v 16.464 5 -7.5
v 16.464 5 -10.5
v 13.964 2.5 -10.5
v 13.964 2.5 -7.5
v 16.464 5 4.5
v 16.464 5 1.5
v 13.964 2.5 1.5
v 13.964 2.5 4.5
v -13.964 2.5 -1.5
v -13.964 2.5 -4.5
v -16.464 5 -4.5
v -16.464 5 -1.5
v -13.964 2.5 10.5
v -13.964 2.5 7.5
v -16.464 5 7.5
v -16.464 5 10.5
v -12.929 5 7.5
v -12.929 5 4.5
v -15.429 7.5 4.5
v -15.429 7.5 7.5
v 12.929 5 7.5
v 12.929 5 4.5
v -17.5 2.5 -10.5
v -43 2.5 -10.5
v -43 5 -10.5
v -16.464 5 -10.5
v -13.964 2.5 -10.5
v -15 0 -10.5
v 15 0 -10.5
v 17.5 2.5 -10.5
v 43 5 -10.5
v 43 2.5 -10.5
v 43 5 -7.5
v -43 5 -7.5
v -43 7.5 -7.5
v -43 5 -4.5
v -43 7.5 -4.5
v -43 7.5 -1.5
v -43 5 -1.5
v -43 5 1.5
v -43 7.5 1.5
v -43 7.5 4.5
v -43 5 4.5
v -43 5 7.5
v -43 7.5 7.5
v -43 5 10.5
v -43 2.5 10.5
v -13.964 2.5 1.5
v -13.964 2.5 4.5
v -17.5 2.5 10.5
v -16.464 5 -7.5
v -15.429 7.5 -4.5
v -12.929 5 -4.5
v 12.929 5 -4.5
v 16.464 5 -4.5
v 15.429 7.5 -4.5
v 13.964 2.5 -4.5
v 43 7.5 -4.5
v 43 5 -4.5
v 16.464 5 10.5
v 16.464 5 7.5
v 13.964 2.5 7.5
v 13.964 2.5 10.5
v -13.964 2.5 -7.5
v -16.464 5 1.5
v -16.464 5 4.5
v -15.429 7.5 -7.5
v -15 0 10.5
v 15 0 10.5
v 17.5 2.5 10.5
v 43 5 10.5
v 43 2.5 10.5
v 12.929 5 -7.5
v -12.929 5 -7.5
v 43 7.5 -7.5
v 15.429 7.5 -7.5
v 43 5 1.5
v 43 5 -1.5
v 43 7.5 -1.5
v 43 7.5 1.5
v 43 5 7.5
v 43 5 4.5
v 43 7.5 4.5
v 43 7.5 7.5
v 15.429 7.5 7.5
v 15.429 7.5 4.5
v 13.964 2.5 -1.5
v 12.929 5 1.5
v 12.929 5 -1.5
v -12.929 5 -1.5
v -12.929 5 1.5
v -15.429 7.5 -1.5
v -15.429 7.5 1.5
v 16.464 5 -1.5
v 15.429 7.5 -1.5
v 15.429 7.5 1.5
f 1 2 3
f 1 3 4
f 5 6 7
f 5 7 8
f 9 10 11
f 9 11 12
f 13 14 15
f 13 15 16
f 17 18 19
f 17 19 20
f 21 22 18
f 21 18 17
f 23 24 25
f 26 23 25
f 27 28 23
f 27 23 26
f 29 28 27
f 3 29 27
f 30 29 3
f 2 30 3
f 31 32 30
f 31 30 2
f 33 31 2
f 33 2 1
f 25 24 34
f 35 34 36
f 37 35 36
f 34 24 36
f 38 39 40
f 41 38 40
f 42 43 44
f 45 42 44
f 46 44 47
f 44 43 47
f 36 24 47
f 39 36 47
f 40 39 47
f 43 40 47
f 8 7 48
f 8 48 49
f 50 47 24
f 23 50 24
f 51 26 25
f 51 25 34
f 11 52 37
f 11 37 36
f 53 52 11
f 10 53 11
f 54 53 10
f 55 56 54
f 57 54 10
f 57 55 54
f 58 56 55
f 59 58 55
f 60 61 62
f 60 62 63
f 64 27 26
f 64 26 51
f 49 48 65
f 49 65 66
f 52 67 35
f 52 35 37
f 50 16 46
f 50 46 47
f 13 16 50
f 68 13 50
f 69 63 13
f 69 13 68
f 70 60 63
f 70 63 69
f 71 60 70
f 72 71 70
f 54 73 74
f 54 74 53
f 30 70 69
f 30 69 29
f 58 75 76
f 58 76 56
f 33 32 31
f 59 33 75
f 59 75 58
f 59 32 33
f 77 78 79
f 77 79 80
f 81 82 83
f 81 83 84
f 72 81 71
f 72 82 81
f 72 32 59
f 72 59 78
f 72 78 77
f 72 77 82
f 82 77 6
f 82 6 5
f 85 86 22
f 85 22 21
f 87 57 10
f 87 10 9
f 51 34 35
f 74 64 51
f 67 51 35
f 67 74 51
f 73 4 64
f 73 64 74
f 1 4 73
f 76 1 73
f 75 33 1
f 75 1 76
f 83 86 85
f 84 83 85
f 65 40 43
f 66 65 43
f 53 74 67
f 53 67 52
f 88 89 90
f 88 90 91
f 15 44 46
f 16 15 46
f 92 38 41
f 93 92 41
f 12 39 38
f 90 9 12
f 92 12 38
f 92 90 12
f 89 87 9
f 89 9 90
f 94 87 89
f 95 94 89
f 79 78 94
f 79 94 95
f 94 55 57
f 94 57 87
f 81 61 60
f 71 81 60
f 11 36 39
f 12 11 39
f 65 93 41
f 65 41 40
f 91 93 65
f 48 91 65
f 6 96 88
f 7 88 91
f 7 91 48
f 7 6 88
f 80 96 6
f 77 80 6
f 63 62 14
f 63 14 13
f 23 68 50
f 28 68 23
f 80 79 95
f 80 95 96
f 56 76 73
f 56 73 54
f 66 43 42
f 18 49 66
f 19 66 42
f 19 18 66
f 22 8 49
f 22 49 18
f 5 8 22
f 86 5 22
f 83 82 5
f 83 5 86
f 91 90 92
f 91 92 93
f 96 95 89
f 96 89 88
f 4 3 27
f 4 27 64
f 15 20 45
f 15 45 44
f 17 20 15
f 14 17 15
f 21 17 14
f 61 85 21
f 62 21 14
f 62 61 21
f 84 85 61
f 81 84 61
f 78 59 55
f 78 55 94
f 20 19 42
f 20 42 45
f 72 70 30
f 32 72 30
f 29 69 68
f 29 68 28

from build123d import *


with BuildPart() as part:
    # Sweep1: sweep along a path in Sketch2
    with BuildLine(Plane.XY) as sweep1_path:
        Line((-43, 2.5), (-17.5, 2.5))
        Line((-17.5, 2.5), (-15, 0))
        Line((-15, 0), (15, 0))
        Line((15, 0), (17.5, 2.5))
        Line((17.5, 2.5), (43, 2.5))
    # Sketch1 → Sweep1 (sweep)
    with BuildSketch(Plane(origin=(0, 0, 0), x_dir=(0, 0, -1), z_dir=(1, 0, 0))):
        Polygon((10.5, 0), (-10.5, 0), (-10.5, 2.5), (-7.5, 2.5), (-7.5, 5), (-4.5, 5), (-4.5, 2.5), (-1.5, 2.5), (-1.5, 5), (1.5, 5), (1.5, 2.5), (4.5, 2.5), (4.5, 5), (7.5, 5), (7.5, 2.5), (10.5, 2.5), align=None)
    sweep(path=sweep1_path.line, transition=Transition.RIGHT)


solid = part.part
